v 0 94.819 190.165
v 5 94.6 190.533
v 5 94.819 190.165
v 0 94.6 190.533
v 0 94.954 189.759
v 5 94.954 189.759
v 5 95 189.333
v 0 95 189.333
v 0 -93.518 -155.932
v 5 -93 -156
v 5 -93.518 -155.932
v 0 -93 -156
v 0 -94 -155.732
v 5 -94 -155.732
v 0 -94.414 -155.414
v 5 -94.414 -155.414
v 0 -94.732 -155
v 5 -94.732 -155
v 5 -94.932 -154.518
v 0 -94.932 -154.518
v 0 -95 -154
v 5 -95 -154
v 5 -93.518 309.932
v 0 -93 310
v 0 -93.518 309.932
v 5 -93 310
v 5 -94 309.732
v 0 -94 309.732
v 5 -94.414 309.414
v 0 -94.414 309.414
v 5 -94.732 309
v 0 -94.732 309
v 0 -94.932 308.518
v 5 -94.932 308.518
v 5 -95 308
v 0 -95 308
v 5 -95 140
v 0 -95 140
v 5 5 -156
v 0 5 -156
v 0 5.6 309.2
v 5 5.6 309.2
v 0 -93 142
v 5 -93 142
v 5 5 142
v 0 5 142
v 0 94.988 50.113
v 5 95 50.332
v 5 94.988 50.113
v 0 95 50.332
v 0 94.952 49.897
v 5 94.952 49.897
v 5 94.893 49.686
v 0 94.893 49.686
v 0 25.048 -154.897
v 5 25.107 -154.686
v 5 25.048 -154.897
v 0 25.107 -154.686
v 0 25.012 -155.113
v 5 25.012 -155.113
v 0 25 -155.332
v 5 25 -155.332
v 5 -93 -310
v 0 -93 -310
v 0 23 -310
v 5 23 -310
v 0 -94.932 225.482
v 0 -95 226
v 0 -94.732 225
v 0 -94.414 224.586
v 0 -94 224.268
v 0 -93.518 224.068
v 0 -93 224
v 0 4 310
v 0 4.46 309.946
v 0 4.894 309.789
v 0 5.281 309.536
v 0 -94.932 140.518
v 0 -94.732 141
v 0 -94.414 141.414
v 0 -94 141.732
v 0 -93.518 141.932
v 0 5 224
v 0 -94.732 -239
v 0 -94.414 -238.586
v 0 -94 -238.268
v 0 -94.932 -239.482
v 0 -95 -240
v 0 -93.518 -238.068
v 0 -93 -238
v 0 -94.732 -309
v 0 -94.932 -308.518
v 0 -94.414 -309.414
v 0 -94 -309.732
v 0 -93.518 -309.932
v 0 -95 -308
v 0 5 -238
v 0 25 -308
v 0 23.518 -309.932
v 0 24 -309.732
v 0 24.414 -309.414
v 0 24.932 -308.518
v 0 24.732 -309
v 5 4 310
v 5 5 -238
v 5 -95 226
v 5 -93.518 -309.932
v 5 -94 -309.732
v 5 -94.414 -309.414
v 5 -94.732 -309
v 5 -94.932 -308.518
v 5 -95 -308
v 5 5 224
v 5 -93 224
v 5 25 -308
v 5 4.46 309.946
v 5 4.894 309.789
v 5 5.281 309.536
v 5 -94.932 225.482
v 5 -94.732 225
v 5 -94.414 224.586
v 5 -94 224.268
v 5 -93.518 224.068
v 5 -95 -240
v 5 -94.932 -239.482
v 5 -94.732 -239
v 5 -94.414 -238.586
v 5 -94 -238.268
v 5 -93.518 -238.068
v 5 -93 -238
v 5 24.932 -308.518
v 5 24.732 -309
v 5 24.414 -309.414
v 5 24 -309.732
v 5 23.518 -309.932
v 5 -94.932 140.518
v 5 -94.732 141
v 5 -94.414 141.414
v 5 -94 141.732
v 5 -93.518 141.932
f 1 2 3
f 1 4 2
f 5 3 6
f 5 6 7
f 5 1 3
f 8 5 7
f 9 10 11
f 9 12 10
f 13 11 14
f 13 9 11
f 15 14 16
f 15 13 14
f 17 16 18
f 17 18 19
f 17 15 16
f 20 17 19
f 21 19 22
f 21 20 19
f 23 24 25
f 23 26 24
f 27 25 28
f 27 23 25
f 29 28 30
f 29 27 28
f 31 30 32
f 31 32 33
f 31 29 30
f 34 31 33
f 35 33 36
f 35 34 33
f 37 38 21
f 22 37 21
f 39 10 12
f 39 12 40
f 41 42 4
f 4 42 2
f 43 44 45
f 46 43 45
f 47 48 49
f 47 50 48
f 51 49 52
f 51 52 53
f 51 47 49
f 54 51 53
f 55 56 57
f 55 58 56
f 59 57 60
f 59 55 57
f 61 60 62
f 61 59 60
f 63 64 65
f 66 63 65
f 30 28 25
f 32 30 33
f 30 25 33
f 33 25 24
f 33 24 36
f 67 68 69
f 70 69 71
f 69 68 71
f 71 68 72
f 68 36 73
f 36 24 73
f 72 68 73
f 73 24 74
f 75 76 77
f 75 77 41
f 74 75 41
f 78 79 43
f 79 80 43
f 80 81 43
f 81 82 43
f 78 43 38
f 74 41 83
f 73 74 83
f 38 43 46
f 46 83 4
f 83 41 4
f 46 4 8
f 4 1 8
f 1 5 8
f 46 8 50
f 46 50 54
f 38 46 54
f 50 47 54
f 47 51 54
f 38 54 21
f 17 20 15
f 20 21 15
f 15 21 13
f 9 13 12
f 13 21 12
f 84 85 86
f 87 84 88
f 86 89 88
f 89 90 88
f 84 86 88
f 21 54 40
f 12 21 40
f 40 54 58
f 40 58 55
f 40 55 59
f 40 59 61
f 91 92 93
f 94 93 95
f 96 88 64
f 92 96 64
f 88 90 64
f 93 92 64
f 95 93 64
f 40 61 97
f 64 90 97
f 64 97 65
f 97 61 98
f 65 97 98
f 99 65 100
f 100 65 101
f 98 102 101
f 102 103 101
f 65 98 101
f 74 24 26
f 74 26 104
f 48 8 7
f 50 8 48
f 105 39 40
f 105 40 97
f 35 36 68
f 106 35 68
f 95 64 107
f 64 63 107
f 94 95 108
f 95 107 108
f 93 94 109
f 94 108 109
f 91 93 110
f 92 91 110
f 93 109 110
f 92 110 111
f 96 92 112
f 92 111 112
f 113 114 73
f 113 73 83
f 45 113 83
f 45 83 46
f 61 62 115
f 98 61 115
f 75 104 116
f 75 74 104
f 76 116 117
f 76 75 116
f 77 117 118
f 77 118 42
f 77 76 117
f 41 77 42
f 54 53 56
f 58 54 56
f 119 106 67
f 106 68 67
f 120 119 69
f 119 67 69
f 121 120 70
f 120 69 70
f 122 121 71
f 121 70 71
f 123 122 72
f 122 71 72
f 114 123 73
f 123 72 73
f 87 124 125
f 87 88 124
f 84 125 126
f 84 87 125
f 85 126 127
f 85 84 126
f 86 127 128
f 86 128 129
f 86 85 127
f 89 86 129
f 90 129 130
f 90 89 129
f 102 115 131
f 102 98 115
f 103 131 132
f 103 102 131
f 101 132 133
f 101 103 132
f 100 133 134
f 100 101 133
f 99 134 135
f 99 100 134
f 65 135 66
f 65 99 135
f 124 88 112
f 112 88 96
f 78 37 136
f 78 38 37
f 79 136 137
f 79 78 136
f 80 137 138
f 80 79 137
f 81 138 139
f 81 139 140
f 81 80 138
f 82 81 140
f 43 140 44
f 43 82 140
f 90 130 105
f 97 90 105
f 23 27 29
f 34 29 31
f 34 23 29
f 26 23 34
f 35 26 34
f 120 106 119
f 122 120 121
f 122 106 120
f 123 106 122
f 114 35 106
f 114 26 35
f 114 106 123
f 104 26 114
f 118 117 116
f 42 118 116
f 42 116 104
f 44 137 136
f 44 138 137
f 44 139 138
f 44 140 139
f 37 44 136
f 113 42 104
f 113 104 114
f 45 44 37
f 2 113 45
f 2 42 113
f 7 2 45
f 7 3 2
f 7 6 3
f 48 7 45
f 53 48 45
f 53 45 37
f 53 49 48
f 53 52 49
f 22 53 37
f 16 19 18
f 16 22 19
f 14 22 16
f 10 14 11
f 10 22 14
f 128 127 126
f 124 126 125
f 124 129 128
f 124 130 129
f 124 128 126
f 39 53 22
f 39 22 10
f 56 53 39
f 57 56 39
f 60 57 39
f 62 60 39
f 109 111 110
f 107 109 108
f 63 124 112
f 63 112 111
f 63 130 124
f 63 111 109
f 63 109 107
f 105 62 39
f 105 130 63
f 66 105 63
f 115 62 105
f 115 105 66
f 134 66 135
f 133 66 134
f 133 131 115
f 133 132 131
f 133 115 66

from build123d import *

# Parameters (mm, degrees)
SKETCH1_W           = 620
SKETCH1_H           = 190
BOSS_EXTRUDE1_DEPTH = 5
SKETCH2_W           = 82
SKETCH2_H           = 100
CUT_EXTRUDE1_DEPTH  = 5
FILLET1_R           = 2


with BuildPart() as part:
    # Sketch1 → Boss-Extrude1 (new body)
    with BuildSketch(Plane(origin=(0, 0, 0), x_dir=(0, 0, -1), z_dir=(1, 0, 0))):
        Rectangle(SKETCH1_W, SKETCH1_H)
    extrude(amount=BOSS_EXTRUDE1_DEPTH)

    # Sketch2 → Cut-Extrude1 (cut)
    with BuildSketch(Plane(origin=(5, 0, 0), x_dir=(0, 0, -1), z_dir=(1, 0, 0))):
        Polygon((-310, 95), (-310, 5), (-190, 95), align=None)
        Polygon((310, 95), (-50, 95), (155, 25), (310, 25), align=None)
        with Locations((-183, -45)):
            Rectangle(SKETCH2_W, SKETCH2_H)
        with Locations((197, -45)):
            Rectangle(SKETCH2_W, SKETCH2_H)
    extrude(amount=-CUT_EXTRUDE1_DEPTH, mode=Mode.SUBTRACT)

    # Fillet1
    fillet1_edges = [part.edges().sort_by_distance(p)[0] for p in [
        (2.5, 25, -155),
        (2.5, 95, 50),
        (2.5, 25, -310),
        (2.5, -95, 142),
        (2.5, -95, 224),
        (2.5, -95, -238),
        (2.5, -95, -156),
        (2.5, 5, 310),
        (2.5, 95, 190),
        (2.5, -95, -310),
        (2.5, -95, 310),
    ]]
    fillet(fillet1_edges, radius=FILLET1_R)


solid = part.part
